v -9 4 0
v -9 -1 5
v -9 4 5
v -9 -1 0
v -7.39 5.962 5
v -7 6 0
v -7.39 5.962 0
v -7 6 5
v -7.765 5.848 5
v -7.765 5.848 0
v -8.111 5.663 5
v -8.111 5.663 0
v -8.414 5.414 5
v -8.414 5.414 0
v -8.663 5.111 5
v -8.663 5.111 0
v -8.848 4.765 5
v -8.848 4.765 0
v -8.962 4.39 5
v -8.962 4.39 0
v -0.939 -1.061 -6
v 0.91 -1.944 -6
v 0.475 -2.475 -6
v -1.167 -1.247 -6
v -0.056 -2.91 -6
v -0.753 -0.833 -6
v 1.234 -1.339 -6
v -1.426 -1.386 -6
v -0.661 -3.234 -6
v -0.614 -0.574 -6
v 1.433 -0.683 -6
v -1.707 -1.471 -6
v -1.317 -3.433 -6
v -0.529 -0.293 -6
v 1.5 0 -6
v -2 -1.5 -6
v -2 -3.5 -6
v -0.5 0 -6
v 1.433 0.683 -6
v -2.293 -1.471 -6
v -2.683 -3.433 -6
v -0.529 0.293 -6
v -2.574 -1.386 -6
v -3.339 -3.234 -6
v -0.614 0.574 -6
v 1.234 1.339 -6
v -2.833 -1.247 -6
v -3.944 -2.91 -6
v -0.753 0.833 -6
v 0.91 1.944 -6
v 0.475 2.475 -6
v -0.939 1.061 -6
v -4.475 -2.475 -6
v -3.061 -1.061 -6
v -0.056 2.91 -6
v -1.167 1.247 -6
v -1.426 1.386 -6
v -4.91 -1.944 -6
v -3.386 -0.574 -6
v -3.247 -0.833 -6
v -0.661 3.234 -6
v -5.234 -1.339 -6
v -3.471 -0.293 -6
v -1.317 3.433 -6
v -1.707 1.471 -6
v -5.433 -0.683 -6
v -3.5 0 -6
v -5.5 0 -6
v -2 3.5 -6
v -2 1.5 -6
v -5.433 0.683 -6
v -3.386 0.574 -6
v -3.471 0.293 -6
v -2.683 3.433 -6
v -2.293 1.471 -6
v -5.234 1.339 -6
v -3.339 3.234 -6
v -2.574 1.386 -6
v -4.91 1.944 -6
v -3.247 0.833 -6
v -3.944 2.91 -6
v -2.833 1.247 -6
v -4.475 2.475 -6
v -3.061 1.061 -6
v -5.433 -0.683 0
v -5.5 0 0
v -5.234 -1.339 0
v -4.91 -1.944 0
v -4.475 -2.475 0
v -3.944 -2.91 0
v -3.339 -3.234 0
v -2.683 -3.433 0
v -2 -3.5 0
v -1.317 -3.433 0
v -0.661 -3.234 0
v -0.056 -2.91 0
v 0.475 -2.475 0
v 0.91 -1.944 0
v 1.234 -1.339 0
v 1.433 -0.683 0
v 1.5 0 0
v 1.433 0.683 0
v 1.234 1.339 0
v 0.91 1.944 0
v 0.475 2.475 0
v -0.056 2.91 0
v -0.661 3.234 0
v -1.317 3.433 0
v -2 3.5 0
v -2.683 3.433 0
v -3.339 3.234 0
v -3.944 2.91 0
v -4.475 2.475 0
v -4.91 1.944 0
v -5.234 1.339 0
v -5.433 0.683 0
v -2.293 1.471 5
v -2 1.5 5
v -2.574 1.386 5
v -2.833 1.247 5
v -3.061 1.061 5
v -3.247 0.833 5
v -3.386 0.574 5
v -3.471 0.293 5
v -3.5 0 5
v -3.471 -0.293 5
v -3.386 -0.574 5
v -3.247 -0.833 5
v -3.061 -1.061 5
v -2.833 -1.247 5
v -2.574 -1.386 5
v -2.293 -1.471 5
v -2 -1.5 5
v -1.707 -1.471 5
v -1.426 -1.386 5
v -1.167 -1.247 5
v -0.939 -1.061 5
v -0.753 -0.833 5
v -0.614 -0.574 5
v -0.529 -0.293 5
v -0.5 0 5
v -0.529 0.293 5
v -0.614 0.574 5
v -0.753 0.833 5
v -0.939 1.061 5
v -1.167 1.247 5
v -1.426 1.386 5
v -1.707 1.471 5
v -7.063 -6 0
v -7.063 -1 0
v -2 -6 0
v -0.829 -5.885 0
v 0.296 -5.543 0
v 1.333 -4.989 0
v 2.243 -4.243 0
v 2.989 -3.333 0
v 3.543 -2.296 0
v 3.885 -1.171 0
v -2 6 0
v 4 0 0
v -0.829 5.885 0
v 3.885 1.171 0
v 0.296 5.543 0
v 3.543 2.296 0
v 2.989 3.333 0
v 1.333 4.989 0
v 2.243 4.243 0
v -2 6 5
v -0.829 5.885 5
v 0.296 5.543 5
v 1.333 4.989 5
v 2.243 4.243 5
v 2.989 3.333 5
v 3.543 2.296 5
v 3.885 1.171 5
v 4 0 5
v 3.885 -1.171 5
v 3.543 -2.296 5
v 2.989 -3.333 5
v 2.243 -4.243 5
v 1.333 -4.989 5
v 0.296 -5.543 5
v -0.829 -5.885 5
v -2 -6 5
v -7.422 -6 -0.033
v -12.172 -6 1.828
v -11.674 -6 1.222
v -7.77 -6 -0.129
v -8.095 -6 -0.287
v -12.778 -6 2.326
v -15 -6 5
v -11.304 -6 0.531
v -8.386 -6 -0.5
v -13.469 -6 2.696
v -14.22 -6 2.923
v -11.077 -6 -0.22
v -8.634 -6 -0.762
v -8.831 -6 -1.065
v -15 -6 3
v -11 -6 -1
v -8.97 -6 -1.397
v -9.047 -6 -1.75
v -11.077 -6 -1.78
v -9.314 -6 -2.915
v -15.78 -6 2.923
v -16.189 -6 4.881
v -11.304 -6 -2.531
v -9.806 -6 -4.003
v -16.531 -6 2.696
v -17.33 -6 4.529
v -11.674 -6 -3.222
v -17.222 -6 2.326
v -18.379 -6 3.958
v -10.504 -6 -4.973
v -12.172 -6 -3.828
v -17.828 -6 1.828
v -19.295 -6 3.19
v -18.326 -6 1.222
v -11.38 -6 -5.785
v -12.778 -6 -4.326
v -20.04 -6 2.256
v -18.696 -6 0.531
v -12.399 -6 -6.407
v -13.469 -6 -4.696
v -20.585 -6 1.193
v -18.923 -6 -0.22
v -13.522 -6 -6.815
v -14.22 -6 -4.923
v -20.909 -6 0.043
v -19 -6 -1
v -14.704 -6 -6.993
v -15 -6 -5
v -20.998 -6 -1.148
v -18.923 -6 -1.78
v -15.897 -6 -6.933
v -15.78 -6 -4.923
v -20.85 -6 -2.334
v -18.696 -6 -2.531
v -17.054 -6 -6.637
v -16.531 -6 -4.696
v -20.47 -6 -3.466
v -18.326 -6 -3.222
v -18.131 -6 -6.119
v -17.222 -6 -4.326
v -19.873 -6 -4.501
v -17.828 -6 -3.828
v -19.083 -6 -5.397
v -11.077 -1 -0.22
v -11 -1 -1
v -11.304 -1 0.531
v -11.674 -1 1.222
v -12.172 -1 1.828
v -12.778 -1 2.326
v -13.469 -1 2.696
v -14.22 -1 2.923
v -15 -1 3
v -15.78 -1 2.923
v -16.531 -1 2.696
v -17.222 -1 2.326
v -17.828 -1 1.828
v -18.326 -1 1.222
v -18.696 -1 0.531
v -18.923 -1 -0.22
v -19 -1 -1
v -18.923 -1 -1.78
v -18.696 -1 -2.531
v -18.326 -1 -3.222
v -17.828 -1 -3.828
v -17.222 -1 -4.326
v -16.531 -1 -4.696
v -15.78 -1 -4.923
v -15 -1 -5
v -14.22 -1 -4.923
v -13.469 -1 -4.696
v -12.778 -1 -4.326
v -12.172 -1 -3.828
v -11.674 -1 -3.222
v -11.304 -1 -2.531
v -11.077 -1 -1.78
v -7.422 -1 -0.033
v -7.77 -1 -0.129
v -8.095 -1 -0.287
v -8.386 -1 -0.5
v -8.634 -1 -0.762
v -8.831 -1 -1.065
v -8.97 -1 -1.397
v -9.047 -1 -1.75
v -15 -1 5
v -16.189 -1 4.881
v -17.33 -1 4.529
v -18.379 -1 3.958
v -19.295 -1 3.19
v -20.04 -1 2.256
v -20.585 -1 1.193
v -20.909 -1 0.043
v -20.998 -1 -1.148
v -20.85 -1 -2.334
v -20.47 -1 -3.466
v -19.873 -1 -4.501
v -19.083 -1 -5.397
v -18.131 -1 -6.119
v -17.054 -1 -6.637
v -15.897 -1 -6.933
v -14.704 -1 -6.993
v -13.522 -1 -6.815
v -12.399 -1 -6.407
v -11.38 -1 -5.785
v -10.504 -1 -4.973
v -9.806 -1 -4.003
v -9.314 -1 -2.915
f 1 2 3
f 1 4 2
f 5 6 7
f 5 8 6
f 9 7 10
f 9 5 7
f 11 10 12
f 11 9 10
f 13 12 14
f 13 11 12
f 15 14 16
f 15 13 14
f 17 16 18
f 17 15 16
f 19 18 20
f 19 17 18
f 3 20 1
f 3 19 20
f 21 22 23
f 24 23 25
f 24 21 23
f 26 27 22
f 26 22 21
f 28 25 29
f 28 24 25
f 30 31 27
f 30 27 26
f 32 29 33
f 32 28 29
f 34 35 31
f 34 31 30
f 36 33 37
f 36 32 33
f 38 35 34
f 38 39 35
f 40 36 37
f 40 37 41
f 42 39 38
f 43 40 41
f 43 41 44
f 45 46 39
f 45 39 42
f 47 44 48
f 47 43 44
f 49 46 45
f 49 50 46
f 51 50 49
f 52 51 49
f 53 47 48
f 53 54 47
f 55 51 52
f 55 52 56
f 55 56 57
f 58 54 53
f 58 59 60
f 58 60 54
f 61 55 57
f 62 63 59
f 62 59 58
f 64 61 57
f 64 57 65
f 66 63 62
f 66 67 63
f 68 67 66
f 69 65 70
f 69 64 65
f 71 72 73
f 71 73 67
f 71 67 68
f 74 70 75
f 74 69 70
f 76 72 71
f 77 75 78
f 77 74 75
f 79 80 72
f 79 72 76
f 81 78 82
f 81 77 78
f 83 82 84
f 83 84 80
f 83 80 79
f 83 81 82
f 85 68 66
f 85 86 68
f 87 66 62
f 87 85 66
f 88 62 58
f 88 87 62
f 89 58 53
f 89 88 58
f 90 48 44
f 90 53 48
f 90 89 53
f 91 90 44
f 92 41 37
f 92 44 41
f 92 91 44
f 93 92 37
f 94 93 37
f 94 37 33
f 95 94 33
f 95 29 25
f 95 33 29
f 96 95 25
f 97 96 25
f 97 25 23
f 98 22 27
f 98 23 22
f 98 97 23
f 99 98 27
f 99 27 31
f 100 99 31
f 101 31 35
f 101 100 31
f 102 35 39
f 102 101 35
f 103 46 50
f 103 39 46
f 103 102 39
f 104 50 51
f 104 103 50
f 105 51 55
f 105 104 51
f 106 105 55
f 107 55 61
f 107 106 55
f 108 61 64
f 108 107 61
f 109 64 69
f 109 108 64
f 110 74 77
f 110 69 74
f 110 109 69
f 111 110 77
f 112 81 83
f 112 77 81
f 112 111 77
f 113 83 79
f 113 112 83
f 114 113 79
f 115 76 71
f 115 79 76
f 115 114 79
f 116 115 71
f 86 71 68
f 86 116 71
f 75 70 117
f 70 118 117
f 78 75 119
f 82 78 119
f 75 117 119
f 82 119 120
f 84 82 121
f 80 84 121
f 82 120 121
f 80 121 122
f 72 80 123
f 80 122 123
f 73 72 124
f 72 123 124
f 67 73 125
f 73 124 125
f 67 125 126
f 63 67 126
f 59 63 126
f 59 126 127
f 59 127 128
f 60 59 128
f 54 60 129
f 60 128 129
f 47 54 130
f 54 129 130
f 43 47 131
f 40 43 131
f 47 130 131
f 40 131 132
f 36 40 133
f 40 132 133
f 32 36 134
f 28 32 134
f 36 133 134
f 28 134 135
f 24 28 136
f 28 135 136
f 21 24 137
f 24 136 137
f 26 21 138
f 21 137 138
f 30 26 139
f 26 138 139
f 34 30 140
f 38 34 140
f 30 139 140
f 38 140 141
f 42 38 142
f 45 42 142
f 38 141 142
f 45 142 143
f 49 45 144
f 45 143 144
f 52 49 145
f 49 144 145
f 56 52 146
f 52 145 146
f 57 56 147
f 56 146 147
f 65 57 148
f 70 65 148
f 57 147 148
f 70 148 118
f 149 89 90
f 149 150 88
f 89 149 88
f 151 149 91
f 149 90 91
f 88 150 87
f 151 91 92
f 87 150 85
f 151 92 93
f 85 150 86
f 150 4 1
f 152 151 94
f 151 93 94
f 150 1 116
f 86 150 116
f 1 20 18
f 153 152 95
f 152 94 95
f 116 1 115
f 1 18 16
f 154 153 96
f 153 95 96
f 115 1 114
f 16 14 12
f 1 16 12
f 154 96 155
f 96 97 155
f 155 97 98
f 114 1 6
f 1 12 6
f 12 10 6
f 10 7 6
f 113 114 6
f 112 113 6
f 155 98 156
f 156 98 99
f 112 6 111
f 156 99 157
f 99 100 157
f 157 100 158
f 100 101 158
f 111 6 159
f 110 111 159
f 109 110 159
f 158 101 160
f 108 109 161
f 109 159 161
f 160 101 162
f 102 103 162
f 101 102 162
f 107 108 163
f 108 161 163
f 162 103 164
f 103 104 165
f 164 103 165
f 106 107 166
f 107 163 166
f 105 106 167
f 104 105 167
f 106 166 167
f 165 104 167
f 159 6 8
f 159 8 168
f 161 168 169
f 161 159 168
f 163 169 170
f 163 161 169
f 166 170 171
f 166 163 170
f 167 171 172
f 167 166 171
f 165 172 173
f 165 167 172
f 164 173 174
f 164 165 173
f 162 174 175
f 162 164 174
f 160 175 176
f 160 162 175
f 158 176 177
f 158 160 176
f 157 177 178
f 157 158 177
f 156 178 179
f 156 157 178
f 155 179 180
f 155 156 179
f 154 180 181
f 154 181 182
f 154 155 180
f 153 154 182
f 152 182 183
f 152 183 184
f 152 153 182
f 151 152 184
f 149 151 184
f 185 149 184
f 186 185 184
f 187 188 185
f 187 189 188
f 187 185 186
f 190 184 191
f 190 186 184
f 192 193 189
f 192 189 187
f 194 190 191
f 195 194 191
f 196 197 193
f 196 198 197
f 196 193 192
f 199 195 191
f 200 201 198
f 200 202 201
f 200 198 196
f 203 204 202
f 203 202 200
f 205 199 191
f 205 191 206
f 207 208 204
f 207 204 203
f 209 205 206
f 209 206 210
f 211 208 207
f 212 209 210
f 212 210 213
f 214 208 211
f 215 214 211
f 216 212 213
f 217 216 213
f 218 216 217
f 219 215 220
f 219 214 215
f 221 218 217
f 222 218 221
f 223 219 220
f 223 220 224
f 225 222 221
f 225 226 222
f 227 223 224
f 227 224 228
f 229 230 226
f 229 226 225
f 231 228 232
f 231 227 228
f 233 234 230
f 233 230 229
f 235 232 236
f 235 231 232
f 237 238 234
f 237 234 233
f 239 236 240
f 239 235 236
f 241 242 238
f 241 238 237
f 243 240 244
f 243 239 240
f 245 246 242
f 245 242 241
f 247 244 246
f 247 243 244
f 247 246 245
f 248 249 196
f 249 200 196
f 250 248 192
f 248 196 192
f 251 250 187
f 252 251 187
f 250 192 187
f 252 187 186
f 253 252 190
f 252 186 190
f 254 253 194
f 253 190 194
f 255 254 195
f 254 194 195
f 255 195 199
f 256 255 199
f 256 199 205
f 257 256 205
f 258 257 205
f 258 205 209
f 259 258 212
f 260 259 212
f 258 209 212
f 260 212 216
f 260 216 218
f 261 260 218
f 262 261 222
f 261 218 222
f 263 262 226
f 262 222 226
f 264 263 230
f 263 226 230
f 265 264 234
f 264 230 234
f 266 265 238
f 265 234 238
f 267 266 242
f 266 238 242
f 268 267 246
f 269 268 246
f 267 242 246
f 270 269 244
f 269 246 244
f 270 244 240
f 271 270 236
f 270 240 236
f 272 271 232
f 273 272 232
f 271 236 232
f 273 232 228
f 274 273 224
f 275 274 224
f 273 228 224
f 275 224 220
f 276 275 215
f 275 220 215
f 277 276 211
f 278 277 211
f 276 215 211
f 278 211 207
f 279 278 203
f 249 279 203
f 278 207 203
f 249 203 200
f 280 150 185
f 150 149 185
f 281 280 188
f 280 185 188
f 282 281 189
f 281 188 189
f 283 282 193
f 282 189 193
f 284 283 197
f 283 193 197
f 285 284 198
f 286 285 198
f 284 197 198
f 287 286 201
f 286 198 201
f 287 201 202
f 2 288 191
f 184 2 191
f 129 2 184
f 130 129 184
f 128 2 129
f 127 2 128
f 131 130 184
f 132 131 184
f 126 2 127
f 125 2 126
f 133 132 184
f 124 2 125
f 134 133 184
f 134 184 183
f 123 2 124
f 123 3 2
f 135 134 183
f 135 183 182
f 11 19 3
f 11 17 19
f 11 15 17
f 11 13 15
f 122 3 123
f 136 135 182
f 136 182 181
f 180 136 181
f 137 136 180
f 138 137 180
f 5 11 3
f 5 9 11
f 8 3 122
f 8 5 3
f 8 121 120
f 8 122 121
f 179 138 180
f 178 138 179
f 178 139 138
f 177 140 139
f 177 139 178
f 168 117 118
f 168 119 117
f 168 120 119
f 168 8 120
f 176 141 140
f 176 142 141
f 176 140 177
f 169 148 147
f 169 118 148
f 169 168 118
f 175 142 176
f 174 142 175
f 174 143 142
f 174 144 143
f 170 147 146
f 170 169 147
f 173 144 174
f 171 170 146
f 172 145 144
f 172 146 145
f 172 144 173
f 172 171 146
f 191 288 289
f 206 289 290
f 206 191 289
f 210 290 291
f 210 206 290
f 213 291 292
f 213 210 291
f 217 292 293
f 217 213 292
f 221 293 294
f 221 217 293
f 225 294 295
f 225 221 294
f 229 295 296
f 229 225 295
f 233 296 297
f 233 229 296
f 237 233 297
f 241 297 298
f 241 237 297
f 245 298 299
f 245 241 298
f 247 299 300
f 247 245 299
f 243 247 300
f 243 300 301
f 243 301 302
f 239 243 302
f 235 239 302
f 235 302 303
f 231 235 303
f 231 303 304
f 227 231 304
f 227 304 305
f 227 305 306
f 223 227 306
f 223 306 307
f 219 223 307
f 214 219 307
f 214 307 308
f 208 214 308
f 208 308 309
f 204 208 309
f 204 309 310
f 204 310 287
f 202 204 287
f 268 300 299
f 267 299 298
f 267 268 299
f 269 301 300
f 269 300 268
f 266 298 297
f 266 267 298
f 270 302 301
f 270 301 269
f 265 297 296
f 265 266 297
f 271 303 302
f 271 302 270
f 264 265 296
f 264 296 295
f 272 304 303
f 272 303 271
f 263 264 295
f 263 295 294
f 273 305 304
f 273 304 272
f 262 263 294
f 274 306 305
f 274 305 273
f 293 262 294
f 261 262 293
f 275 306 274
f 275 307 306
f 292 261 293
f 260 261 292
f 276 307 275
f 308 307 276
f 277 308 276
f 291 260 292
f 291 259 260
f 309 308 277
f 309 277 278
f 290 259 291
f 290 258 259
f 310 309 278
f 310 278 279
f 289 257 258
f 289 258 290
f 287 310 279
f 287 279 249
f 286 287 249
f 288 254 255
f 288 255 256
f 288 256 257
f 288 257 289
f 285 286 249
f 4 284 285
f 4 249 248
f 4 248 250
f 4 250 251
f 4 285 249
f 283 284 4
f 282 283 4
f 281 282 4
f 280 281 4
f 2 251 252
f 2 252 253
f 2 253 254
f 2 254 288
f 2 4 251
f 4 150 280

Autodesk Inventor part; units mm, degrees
ref_plane "YZ Plane" through (0, 0, 0) normal (1, 0, 0) x (0, 1, 0)
ref_plane "XZ Plane" through (0, 0, 0) normal (0, 1, 0) x (-1, 0, 0)
ref_plane "XY Plane" through (0, 0, 0) normal (0, 0, 1) x (1, 0, 0)
sketch "Sketch1" plane through (0, 0, 0) normal (0, 0, 1) x (1, 0, 0)
  circle A0 centre (-2, 0) radius 4 projected
  arc A1 (-2, 6) -> (-2, -6) centre (-2, 0) ccw projected
  circle A2 centre (-2, 0) radius 6
  line L0 (-2, -6) -> (-9, -6)
  line L1 (-9, -6) -> (-9, 6)
  line L2 (-9, 6) -> (-2, 6)
  line L3 (-2, 6) -> (-2, -6)
  point P0 (0, 0)
  point P1 (-2, -6)
  dimension "d0" = 7
extrude "Extrusion1" add sketch "Sketch1" along normal blind 5
sketch "Sketch2" plane through (0, 0, 0) normal (0, 0, -1) x (-1, 0, 0)
  circle A0 centre (2, 0) radius 4 projected
  circle A1 centre (2, 0) radius 3.5
  point P0 (0, 0)
  dimension "d3" = 7
extrude "Extrusion2" add sketch "Sketch2" along normal blind 6 contours A1
sketch "Sketch4" plane through (-2, 0, -6) normal (0, 0, -1) x (-1, 0, 0)
  circle A0 centre (0, 0) radius 3.5 projected
  point P0 (-2, 0)
hole "Hole1" at (-2, 0, -6) direction (0, 0, 1) diameter 3 end through all
sketch "Sketch5" plane through (-9, -6, 0) normal (0, -1, 0) x (1, 0, 0)
  circle A0 centre (-6, -1) radius 4
  circle A1 centre (-6, -1) radius 6
  line L0 (0, 0) -> (0, 5) projected
  line L1 (0, 5) -> (-6, 5)
  line L2 (0, 5) -> (7, 5) projected
  line L3 (0, 0) -> (7, 0) projected
  line L4 (0, 0) -> (-0.0839, 0)
  point P0 (9, 0)
  dimension "d15" = 8
  dimension "d16" = 12
  dimension "d20" = 6
extrude "Extrusion4" add sketch "Sketch5" against normal blind 5
fillet "Fillet1" radius 2 1 edges at (-9.0839, -3.5, 0)
fillet "Fillet2" radius 2 1 edges at (-9, 6, 2.5)
equation "\"d17\" = d1"
equation "\"d1\" = 5"
properties part number "center_holder_top_center"
